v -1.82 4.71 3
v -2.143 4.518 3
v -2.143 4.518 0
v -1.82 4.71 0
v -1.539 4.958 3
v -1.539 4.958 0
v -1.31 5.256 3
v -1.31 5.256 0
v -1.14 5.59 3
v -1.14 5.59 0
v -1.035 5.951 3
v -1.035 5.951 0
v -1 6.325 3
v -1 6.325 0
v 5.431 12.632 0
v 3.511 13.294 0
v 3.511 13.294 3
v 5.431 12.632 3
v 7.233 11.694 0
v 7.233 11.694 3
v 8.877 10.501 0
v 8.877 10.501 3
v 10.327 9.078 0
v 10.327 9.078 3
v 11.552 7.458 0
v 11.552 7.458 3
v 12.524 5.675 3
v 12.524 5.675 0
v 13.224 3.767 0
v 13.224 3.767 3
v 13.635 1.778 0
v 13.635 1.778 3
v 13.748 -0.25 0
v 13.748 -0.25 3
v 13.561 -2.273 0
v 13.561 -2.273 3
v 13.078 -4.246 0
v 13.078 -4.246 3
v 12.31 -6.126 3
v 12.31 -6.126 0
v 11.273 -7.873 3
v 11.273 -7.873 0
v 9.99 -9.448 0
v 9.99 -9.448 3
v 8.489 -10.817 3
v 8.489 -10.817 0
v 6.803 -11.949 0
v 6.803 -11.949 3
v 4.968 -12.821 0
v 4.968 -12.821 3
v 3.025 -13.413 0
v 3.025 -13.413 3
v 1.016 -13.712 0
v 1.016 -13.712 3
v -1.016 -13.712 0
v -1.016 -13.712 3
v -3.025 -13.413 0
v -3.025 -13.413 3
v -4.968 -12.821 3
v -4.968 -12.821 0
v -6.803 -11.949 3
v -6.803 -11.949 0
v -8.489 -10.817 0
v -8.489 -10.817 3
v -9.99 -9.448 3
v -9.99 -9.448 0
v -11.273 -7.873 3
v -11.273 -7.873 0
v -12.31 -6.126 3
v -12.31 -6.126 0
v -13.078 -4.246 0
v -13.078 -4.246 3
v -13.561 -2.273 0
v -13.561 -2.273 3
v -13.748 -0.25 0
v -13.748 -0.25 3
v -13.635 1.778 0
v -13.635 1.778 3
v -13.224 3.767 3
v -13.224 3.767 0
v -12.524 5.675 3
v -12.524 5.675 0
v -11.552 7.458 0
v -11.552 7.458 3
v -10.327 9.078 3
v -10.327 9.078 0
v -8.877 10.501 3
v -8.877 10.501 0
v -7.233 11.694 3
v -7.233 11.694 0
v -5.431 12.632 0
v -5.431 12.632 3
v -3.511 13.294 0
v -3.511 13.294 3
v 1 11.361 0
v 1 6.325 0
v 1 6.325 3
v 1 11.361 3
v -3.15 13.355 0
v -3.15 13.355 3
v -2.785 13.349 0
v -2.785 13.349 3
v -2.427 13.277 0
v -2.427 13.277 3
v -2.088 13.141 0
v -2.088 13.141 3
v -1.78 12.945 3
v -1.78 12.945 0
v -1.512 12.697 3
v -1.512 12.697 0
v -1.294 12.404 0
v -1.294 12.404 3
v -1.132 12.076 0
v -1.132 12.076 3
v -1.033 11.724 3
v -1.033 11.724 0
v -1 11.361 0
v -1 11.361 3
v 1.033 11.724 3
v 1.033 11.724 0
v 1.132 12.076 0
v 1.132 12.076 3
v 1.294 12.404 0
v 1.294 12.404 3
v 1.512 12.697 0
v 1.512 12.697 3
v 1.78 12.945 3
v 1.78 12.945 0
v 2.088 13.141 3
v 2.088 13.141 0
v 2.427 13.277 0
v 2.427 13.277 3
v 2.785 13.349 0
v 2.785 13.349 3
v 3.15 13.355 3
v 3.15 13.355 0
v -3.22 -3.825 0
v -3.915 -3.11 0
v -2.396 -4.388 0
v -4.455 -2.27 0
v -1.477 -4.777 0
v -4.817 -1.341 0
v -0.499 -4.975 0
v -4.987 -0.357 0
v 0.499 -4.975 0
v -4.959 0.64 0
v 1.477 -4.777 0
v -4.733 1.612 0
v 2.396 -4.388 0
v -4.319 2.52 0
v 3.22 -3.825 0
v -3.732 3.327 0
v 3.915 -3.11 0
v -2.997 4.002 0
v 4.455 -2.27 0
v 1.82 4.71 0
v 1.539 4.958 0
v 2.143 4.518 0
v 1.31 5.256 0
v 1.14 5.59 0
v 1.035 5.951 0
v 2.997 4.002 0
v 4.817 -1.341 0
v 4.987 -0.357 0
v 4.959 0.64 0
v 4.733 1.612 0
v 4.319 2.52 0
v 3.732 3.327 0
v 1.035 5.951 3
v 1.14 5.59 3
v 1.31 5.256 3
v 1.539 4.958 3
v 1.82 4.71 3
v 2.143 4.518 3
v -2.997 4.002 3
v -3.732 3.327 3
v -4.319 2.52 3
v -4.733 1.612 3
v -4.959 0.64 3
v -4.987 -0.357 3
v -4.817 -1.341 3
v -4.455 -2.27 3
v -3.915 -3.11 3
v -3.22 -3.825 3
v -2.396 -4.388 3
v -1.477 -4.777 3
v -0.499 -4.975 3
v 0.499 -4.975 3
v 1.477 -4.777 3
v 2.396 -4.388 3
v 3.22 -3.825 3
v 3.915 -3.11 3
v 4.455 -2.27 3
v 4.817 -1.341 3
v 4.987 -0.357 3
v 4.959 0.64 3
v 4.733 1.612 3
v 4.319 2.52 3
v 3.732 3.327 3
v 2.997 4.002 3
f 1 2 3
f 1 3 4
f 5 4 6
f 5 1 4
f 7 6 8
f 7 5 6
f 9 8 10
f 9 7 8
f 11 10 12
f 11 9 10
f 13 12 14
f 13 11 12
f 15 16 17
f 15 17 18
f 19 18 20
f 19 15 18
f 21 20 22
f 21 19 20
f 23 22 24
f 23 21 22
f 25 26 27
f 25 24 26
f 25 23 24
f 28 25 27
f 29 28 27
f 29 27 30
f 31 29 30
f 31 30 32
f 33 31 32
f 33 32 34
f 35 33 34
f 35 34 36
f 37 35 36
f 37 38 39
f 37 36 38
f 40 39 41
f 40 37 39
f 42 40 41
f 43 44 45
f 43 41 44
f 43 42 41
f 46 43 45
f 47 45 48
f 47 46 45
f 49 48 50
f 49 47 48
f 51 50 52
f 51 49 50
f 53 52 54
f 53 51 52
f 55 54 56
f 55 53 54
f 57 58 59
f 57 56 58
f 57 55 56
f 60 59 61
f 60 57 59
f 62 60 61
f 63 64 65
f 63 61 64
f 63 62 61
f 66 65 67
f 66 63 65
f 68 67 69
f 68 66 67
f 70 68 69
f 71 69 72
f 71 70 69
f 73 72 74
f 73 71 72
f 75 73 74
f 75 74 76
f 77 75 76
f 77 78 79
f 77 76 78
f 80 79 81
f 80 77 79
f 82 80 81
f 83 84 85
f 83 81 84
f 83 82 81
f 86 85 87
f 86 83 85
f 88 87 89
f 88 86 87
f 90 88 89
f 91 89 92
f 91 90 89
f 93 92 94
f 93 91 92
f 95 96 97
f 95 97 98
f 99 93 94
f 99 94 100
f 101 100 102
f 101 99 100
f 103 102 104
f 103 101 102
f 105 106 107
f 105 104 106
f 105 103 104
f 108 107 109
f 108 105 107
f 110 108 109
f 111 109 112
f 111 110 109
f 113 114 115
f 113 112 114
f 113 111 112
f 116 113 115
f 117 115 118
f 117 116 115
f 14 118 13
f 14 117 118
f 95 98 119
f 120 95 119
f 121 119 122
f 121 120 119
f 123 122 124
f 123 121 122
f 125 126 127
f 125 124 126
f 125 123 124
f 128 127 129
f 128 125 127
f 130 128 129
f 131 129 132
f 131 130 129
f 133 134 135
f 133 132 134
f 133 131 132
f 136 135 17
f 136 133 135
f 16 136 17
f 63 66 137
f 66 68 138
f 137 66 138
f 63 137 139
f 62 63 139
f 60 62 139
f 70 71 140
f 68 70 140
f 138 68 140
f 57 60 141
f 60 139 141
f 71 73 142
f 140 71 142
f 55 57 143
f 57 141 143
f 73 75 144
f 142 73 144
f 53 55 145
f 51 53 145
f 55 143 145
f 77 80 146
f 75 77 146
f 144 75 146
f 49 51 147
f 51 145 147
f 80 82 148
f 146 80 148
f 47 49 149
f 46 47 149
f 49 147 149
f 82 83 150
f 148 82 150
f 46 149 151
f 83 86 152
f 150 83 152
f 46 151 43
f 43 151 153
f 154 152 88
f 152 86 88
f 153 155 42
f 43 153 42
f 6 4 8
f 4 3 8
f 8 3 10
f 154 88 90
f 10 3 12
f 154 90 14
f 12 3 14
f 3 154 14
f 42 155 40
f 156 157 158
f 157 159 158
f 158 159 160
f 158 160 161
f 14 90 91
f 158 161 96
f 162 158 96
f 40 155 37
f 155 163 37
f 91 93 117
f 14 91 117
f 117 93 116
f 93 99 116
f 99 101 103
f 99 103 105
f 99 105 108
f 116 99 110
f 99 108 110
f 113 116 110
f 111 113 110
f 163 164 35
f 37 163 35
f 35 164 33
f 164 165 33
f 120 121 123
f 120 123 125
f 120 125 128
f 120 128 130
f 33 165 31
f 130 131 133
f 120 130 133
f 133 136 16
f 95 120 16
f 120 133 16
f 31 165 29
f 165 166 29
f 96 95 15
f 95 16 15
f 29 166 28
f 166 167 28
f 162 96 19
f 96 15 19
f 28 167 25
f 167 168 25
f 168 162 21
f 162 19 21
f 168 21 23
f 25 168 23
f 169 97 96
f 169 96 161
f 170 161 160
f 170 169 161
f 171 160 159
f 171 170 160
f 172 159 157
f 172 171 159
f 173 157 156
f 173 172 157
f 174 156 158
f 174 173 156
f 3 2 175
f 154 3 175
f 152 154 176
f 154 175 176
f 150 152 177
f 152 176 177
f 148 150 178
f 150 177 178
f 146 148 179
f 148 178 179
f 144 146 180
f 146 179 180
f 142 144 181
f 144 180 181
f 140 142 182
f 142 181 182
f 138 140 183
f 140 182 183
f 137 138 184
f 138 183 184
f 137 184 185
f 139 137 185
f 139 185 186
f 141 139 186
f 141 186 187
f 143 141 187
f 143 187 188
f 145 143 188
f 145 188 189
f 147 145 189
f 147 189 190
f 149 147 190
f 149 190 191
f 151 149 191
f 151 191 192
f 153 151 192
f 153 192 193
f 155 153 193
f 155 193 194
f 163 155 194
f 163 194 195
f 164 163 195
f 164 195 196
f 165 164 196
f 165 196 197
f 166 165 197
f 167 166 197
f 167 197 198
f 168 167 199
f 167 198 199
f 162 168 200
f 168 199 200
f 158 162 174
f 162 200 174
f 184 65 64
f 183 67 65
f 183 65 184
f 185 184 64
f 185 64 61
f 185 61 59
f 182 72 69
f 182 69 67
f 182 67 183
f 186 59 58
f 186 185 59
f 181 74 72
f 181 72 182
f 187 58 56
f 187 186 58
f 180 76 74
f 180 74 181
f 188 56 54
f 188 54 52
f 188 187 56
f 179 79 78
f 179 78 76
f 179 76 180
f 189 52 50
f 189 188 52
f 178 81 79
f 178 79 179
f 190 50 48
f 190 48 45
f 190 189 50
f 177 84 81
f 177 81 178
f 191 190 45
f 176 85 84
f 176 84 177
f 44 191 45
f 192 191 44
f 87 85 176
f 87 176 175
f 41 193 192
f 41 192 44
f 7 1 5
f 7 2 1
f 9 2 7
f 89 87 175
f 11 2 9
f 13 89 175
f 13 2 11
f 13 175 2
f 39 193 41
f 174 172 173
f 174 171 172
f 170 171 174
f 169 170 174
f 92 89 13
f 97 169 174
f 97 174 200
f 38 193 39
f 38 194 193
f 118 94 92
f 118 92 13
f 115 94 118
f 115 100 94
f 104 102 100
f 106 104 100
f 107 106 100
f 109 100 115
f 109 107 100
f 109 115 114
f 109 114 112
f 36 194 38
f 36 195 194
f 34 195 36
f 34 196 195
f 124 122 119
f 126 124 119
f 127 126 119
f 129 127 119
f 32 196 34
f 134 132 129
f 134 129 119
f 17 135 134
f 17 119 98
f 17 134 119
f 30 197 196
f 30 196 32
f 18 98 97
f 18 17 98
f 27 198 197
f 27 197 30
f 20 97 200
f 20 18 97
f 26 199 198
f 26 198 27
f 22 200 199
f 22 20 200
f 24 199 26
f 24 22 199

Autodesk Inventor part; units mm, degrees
ref_plane "YZ Plane" through (0, 0, 0) normal (1, 0, 0) x (0, 1, 0)
ref_plane "XZ Plane" through (0, 0, 0) normal (0, 1, 0) x (-1, 0, 0)
ref_plane "XY Plane" through (0, 0, 0) normal (0, 0, 1) x (1, 0, 0)
sketch "Sketch1" plane through (0, 0, 0) normal (0, 0, 1) x (1, 0, 0)
  arc A0 (-3.5106, 13.2943) -> (3.5106, 13.2943) centre (0, 0) ccw
  circle A1 centre (0, 0) radius 4.5 construction
  line L0 (-1, 11.3606) -> (-1, 3.5)
  line L1 (1, 3.5) -> (1, 11.3606)
  arc A2 (-1, 3.5) -> (1, 3.5) centre (0, 3.5) ccw
  line L2 (-9.75, -9.75) -> (9.75, -9.75) construction
  line L3 (9.75, -9.75) -> (9.75, 9.75) construction
  line L4 (9.75, 9.75) -> (-9.75, 9.75) construction
  line L5 (-9.75, 9.75) -> (-9.75, -9.75) construction
  line L6 (-9.75, -9.75) -> (9.75, 9.75) construction
  line L7 (9.75, -9.75) -> (-9.75, 9.75) construction
  arc A3 (-1, 11.3606) -> (-3.5106, 13.2943) centre (-3, 11.3606) ccw
  arc A4 (3.5106, 13.2943) -> (1, 11.3606) centre (3, 11.3606) ccw
  point P0 (0, 6.1182)
  point P1 (0, 4.5)
  point P2 (0, 2.5)
  point P3 (0, 2.5)
  dimension "d1" = 9
  dimension "d0" = 27.5
  dimension "d2" = 2
  dimension "d3" = 2
  dimension "d5" = 19.5
  dimension "d9" = 19.5
  dimension "d10" = 2
extrude "Extrusion1" add sketch "Sketch1" along normal blind 3
sketch "Sketch2" plane through (0, 0, 3) normal (0, 0, 1) x (1, 0, 0)
  circle A0 centre (0, 0) radius 5
  dimension "d11" = 10
extrude "Extrusion2" cut sketch "Sketch2" against normal through all
fillet "Fillet1" radius 2 2 edges at (-1, 4.899, 1.5) (1, 4.899, 1.5)
properties part number "FrontTerm"
